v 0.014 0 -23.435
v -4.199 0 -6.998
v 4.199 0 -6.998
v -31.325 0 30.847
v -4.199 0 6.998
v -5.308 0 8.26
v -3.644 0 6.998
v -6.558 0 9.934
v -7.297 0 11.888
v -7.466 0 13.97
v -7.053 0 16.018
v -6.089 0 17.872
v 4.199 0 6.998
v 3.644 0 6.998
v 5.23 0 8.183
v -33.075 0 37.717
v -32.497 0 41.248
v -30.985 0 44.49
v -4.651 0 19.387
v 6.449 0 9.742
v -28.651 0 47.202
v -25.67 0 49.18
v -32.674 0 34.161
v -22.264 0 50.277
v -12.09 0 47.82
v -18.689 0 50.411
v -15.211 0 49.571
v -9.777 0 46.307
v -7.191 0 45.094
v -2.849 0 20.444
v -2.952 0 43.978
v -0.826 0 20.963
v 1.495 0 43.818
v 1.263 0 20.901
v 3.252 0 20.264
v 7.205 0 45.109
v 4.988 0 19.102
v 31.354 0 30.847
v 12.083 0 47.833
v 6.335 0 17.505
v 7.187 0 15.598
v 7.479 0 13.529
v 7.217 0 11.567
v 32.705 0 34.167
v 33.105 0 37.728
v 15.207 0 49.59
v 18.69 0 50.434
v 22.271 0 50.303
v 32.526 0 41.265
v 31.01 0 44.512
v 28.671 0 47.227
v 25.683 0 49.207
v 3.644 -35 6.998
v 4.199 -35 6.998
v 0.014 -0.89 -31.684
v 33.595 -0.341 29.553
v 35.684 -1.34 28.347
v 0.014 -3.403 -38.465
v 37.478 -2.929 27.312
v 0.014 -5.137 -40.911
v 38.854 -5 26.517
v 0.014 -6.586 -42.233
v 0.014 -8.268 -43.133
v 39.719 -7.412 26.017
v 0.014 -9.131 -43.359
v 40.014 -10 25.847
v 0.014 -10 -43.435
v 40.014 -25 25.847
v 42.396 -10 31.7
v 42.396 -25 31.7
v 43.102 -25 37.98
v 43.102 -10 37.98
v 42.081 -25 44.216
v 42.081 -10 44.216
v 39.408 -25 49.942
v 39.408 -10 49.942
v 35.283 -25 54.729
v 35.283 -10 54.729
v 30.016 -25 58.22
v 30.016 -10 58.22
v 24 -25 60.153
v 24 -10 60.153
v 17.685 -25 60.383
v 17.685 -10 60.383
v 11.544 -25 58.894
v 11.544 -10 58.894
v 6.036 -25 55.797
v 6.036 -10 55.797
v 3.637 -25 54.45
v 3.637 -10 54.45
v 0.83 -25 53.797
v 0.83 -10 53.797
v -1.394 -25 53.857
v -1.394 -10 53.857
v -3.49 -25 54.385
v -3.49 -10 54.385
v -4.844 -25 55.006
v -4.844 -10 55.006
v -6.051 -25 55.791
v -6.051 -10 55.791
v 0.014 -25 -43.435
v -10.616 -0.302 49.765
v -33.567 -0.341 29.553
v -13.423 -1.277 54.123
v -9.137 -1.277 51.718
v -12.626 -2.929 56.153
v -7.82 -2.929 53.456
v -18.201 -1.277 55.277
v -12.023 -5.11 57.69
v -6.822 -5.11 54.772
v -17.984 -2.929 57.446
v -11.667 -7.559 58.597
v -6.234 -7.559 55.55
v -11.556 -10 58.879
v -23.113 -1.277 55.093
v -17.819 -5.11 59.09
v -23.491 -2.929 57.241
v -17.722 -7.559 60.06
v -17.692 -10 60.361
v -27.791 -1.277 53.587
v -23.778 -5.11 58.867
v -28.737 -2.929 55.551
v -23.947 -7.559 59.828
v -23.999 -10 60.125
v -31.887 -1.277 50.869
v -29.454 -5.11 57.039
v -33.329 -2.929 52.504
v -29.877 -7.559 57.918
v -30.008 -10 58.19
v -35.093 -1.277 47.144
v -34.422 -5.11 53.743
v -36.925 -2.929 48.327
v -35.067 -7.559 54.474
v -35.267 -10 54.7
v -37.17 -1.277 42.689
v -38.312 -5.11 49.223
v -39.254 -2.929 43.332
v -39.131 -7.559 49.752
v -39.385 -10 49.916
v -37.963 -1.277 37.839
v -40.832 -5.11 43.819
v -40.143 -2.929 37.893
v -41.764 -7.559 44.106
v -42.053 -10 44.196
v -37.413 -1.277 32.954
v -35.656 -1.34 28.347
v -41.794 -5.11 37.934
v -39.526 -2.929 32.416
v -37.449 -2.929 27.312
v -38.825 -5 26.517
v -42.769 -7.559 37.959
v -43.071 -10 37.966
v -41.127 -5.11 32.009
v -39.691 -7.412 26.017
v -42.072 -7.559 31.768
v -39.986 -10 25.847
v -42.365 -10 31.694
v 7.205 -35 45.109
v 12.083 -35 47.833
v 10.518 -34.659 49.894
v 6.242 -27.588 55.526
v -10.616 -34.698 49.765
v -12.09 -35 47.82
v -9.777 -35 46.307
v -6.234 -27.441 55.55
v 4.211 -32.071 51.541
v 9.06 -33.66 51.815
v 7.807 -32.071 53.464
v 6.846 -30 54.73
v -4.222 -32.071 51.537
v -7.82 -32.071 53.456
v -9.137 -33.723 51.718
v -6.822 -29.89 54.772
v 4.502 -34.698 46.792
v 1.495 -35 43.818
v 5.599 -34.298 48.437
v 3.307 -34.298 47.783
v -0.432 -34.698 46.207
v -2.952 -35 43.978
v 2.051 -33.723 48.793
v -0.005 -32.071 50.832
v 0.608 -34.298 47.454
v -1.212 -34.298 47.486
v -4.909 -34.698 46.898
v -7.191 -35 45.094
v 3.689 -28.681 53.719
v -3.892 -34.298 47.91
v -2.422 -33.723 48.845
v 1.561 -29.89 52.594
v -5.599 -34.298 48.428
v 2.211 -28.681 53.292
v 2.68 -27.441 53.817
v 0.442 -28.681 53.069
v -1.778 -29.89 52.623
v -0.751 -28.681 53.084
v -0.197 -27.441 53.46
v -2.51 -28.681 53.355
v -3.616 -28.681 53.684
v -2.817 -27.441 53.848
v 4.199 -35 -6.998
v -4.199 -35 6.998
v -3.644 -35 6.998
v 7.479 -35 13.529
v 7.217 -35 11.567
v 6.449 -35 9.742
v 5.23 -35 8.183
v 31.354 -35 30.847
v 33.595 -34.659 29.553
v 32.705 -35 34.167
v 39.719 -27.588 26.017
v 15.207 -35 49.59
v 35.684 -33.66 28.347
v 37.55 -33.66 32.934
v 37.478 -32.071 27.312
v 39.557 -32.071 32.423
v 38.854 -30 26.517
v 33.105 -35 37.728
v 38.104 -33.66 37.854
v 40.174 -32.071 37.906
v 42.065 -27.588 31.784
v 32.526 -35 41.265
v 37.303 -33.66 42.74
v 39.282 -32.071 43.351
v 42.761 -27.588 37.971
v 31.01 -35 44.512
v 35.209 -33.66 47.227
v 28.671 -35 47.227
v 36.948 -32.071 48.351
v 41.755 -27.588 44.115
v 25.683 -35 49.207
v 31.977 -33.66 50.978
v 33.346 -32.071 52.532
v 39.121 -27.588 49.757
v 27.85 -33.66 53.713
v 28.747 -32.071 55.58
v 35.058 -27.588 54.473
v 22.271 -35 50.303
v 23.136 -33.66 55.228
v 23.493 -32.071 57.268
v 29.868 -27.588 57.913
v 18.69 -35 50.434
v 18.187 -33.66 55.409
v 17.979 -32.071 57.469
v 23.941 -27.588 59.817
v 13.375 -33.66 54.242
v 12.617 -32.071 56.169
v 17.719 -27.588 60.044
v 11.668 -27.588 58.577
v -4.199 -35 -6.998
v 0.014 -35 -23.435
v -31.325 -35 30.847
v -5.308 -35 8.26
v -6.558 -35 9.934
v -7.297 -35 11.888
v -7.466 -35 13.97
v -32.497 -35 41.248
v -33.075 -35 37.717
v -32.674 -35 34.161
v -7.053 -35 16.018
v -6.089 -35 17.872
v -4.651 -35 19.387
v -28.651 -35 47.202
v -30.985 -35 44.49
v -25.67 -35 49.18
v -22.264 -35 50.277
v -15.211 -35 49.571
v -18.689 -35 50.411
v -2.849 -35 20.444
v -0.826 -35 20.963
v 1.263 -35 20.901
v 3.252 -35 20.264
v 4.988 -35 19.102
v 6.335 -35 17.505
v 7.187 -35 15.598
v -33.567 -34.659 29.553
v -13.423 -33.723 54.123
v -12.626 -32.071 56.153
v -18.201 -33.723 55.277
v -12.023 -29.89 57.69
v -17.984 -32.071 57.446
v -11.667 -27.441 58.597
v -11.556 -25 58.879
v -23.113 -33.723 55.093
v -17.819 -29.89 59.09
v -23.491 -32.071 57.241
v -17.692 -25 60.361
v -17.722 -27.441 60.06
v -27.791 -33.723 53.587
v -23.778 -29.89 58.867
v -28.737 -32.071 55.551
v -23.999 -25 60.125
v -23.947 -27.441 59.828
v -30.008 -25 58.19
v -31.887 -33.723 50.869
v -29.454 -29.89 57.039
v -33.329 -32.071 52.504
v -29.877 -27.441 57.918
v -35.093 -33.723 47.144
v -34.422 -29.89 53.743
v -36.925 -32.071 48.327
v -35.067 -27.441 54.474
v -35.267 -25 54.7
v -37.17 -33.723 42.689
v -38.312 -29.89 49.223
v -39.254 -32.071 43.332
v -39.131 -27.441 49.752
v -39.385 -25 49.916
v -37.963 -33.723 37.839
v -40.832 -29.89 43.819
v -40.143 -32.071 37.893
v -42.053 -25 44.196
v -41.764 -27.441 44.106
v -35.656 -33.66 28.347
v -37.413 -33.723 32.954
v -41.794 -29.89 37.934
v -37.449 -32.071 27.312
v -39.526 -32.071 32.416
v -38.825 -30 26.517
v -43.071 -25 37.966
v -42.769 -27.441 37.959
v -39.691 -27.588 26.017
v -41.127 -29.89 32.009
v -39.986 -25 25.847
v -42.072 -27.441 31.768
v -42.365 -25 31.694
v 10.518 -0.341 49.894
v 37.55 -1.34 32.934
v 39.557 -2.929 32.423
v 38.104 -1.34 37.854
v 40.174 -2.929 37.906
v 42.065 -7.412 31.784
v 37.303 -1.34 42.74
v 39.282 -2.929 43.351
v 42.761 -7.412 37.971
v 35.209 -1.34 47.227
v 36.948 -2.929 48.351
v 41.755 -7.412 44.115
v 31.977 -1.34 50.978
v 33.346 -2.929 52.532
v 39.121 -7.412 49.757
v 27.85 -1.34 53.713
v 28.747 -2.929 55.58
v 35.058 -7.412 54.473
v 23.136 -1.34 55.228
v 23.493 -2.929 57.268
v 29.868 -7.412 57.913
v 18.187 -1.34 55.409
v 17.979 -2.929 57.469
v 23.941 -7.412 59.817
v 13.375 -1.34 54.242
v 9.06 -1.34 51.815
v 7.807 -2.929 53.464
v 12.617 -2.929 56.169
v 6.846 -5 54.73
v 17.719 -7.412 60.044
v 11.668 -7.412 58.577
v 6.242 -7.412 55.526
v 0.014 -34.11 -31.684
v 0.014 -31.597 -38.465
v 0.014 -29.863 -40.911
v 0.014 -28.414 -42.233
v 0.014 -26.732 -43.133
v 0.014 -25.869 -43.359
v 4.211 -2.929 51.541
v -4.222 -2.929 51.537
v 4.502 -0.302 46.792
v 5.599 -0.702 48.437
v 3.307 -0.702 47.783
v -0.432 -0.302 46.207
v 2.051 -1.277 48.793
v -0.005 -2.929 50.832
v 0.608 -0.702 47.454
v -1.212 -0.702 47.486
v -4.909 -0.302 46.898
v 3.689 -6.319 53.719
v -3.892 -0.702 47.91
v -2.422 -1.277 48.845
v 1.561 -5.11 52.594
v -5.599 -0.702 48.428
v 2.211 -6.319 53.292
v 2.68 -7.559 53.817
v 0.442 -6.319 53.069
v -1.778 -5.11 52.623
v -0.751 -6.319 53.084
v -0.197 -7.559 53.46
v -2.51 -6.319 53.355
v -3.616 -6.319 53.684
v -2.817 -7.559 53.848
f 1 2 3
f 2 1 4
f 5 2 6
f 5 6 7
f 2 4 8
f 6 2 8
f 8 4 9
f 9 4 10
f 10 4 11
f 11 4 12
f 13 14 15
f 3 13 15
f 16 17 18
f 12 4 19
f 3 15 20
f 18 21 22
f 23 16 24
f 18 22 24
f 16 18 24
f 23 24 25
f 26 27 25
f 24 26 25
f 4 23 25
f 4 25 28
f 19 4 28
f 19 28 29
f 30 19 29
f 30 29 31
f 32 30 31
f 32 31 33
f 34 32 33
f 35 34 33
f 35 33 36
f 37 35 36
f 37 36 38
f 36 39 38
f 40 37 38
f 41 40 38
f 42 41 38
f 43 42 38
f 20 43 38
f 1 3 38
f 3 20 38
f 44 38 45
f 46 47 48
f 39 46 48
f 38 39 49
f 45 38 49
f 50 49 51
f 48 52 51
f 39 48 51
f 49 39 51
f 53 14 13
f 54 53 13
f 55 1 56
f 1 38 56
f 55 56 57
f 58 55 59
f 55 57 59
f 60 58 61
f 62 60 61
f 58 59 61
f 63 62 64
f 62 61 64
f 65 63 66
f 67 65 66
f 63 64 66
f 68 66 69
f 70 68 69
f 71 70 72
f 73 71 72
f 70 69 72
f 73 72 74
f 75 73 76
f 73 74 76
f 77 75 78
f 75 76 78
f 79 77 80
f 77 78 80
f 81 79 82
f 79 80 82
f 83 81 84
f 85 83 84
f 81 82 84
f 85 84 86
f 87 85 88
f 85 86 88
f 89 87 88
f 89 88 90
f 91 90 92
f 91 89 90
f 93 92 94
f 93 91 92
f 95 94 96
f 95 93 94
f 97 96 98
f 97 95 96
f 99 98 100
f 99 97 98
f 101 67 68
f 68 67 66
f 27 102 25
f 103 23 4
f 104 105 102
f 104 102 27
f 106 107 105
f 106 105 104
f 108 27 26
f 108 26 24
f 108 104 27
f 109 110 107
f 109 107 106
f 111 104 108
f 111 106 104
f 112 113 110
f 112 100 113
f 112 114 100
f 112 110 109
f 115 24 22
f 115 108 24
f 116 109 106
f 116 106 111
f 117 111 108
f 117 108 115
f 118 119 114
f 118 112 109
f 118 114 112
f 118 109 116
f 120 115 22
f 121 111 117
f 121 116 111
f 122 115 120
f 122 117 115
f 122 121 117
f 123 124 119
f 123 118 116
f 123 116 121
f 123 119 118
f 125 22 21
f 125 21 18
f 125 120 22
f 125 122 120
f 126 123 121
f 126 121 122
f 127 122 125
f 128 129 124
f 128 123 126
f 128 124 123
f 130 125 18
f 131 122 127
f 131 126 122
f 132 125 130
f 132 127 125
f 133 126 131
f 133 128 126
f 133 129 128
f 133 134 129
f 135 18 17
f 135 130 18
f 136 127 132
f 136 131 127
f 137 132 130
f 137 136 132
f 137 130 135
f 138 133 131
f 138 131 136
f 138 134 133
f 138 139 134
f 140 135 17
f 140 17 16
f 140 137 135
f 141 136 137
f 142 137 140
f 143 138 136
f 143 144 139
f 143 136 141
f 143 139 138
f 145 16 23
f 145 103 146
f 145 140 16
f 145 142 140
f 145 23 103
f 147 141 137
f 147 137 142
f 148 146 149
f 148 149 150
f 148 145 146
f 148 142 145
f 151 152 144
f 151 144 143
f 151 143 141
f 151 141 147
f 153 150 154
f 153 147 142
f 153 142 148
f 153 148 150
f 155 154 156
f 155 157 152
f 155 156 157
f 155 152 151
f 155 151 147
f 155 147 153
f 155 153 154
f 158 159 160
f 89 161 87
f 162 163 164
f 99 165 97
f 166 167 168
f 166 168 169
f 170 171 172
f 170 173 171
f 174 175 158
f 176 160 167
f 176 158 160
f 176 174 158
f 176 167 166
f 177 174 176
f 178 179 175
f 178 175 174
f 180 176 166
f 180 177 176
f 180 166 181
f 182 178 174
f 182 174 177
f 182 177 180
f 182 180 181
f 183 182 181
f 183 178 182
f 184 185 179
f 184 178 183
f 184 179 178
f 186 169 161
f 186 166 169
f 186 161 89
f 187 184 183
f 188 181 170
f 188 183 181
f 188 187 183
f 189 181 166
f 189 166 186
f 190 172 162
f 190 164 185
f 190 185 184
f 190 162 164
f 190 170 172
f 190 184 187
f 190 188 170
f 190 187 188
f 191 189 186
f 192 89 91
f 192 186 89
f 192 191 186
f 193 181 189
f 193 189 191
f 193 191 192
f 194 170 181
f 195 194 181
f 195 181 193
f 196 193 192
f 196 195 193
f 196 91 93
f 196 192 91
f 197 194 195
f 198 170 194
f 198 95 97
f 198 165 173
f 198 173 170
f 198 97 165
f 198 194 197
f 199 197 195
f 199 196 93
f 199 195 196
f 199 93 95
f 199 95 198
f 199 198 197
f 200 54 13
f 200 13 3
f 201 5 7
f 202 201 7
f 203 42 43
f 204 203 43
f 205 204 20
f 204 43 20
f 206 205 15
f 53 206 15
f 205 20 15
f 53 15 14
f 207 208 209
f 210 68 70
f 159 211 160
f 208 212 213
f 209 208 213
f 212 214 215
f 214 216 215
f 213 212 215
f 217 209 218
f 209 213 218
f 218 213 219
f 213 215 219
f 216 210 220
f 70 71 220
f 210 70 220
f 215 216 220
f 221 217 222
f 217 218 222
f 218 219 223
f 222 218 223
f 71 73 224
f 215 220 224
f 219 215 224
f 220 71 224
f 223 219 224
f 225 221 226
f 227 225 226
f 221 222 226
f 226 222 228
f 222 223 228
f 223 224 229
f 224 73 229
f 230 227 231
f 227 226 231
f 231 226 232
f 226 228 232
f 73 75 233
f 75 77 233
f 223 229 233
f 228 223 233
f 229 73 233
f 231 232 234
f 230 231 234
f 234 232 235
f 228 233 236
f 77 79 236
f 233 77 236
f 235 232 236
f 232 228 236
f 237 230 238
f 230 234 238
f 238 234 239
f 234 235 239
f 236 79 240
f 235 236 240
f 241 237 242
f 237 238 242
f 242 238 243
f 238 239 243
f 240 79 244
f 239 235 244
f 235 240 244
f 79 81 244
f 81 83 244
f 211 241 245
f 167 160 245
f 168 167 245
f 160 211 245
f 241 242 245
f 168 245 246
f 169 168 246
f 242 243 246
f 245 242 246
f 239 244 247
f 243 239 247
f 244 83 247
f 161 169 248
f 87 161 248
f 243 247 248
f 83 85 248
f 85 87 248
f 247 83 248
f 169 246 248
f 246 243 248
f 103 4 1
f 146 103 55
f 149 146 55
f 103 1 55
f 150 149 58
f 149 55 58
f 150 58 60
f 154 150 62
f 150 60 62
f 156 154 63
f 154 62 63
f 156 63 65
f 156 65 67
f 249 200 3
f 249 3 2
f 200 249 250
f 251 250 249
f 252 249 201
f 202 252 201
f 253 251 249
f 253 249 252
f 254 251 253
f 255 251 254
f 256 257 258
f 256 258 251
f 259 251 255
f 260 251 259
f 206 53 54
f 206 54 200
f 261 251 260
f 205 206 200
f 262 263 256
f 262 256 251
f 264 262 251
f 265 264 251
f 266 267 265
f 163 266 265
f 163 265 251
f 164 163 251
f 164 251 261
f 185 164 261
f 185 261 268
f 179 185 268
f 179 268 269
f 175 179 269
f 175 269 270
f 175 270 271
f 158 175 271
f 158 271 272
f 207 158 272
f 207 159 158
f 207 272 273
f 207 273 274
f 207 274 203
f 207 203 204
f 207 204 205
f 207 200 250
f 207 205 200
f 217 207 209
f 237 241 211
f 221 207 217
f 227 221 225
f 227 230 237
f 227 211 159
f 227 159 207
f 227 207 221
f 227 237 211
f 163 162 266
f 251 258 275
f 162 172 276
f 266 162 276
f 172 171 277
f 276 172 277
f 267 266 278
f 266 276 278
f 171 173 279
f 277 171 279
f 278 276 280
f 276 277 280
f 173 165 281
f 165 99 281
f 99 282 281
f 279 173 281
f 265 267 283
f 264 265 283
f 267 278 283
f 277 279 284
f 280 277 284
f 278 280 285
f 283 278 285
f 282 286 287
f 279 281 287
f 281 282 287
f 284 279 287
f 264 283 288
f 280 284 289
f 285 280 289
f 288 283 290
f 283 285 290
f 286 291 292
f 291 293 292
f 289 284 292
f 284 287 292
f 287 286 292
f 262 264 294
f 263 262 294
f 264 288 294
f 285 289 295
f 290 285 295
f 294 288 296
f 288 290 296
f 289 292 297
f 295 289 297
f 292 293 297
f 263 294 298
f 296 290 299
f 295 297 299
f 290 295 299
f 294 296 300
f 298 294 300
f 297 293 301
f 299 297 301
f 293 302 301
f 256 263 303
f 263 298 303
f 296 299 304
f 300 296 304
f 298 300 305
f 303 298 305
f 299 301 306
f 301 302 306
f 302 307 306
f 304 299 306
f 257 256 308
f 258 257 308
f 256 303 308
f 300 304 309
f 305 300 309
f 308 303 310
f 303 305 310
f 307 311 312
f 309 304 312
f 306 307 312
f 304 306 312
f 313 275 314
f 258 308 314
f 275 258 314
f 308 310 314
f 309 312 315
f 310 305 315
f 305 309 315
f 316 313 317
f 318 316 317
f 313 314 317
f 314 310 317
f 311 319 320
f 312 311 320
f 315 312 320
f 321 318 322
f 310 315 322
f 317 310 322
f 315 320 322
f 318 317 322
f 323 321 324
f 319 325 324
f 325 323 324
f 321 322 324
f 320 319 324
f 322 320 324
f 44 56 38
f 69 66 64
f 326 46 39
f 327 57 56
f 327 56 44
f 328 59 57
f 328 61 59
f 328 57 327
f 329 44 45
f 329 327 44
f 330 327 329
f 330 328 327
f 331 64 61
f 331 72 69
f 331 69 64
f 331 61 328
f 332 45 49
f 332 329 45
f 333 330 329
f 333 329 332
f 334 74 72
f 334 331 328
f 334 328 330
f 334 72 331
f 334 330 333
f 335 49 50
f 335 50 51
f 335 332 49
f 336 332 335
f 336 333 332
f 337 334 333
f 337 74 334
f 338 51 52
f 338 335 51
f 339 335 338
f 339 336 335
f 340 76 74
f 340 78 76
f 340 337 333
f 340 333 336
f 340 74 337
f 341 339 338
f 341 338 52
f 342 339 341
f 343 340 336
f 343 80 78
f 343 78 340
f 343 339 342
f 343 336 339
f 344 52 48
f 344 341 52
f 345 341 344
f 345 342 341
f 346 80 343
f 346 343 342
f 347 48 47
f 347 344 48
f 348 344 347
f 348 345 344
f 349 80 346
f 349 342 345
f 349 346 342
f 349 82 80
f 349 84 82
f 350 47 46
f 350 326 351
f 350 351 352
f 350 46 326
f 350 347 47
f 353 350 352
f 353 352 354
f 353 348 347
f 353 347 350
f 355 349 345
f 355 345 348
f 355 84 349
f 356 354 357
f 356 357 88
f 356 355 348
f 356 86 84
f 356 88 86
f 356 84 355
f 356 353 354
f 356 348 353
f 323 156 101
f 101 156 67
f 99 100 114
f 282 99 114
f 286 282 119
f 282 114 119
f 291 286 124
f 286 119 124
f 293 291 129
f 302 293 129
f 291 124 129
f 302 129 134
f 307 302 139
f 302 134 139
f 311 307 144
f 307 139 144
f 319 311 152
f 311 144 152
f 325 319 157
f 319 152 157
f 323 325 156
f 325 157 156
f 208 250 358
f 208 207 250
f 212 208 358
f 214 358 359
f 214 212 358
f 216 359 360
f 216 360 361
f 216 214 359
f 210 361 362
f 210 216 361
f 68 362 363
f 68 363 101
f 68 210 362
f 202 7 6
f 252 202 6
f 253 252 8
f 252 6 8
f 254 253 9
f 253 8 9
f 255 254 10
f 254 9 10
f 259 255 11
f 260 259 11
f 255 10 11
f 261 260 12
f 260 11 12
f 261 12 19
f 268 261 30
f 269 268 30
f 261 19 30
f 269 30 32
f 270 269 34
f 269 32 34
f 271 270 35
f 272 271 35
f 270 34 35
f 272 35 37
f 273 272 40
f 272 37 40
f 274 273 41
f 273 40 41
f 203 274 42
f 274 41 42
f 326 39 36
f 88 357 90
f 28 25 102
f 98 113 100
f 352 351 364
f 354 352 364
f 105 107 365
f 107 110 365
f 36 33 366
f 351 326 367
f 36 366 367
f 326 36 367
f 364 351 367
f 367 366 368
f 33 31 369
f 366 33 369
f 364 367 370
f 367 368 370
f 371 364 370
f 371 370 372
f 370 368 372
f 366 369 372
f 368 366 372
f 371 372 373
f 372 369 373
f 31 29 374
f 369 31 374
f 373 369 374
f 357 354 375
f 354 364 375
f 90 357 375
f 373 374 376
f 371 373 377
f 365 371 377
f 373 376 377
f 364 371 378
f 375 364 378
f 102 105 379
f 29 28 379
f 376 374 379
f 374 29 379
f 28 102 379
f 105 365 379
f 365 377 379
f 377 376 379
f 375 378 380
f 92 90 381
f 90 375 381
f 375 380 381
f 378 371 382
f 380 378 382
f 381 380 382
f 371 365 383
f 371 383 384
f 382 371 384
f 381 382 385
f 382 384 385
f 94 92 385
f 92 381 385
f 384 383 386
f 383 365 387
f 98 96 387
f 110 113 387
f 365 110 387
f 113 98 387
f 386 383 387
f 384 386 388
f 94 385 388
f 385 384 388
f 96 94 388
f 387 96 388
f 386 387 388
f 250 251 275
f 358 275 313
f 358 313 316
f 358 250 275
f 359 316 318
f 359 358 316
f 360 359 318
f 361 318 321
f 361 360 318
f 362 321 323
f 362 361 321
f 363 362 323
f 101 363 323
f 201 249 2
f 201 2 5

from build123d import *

# Parameters (mm, degrees)
F1_DEPTH = 35
F2_F1_R  = 10
F2_F2_R  = 10


with BuildPart() as f1:
    # F0 (on Front) → F1 (new body)
    with BuildSketch(Plane.XZ):
        with BuildLine():
            ThreePointArc((-0.0047558207, 48.9411353783), (-31.5398699376, 57.380504031), (-39.9857325354, 25.8471285283))
            Line((-39.9857325354, 25.8471285283), (0.0142674646, -43.4349037745))
            Line((0.0142674646, -43.4349037745), (40.0142674646, 25.8471285283))
            ThreePointArc((40.0142674646, 25.8471285283), (31.5541374022, 57.4077646413), (-0.0047558207, 48.9411353783))
        make_face()
        with BuildLine():
            ThreePointArc((-3.643705829, 6.997927092), (-3.7871096163, 19.9786310917), (7.4790206276, 13.5293249041))
            ThreePointArc((7.4790206276, 13.5293249041), (6.4493061876, 9.7422152878), (3.643705829, 6.997927092))
            Line((3.643705829, 6.997927092), (4.1987560689, 6.997927092))
            Line((4.1987560689, 6.997927092), (4.1987560689, -6.997927092))
            Line((4.1987560689, -6.997927092), (-4.1987560689, -6.997927092))
            Line((-4.1987560689, -6.997927092), (-4.1987560689, 6.997927092))
            Line((-4.1987560689, 6.997927092), (-3.643705829, 6.997927092))
        make_face(mode=Mode.SUBTRACT)
        with BuildLine():
            ThreePointArc((0, 25.8471285283), (-3.0951138699, 37.3934950566), (-0.0047558207, 48.9411353783))
            ThreePointArc((-0.0047558207, 48.9411353783), (3.0929066858, 37.3947693749), (0, 25.8471285283))
        make_face(mode=Mode.SUBTRACT)
        with BuildLine():
            ThreePointArc((0, 25.8471285283), (3.0929066858, 37.3947693749), (-0.0047558207, 48.9411353783))
            ThreePointArc((-0.0047558207, 48.9411353783), (-3.0951138699, 37.3934950566), (0, 25.8471285283))
        make_face()
    extrude(amount=F1_DEPTH)

    # F2: fillet of radius 10 on 4 edges, made by hand

    # F2_f1
    f2_f1_edges = [f1.edges().sort_by_distance(p)[0] for p in [
        (-0.0047558207, -17.5, 48.9411353783),
    ]]
    fillet(f2_f1_edges, radius=F2_F1_R)

    # F2_f2
    f2_f2_edges = [f1.edges().sort_by_distance(p)[0] for p in [
        (-35.2672128577, 0, 54.7003379421),
        (-35.2672128577, -35, 54.7003379421),
        (-19.9857325354, -35, -8.7938876231),
        (-19.9857325354, 0, -8.7938876231),
        (-0.0065856085, -35, 53.761031934),
        (-0.0065856085, 0, 53.761031934),
    ]]
    fillet(f2_f2_edges, radius=F2_F2_R)


solid = f1.part
